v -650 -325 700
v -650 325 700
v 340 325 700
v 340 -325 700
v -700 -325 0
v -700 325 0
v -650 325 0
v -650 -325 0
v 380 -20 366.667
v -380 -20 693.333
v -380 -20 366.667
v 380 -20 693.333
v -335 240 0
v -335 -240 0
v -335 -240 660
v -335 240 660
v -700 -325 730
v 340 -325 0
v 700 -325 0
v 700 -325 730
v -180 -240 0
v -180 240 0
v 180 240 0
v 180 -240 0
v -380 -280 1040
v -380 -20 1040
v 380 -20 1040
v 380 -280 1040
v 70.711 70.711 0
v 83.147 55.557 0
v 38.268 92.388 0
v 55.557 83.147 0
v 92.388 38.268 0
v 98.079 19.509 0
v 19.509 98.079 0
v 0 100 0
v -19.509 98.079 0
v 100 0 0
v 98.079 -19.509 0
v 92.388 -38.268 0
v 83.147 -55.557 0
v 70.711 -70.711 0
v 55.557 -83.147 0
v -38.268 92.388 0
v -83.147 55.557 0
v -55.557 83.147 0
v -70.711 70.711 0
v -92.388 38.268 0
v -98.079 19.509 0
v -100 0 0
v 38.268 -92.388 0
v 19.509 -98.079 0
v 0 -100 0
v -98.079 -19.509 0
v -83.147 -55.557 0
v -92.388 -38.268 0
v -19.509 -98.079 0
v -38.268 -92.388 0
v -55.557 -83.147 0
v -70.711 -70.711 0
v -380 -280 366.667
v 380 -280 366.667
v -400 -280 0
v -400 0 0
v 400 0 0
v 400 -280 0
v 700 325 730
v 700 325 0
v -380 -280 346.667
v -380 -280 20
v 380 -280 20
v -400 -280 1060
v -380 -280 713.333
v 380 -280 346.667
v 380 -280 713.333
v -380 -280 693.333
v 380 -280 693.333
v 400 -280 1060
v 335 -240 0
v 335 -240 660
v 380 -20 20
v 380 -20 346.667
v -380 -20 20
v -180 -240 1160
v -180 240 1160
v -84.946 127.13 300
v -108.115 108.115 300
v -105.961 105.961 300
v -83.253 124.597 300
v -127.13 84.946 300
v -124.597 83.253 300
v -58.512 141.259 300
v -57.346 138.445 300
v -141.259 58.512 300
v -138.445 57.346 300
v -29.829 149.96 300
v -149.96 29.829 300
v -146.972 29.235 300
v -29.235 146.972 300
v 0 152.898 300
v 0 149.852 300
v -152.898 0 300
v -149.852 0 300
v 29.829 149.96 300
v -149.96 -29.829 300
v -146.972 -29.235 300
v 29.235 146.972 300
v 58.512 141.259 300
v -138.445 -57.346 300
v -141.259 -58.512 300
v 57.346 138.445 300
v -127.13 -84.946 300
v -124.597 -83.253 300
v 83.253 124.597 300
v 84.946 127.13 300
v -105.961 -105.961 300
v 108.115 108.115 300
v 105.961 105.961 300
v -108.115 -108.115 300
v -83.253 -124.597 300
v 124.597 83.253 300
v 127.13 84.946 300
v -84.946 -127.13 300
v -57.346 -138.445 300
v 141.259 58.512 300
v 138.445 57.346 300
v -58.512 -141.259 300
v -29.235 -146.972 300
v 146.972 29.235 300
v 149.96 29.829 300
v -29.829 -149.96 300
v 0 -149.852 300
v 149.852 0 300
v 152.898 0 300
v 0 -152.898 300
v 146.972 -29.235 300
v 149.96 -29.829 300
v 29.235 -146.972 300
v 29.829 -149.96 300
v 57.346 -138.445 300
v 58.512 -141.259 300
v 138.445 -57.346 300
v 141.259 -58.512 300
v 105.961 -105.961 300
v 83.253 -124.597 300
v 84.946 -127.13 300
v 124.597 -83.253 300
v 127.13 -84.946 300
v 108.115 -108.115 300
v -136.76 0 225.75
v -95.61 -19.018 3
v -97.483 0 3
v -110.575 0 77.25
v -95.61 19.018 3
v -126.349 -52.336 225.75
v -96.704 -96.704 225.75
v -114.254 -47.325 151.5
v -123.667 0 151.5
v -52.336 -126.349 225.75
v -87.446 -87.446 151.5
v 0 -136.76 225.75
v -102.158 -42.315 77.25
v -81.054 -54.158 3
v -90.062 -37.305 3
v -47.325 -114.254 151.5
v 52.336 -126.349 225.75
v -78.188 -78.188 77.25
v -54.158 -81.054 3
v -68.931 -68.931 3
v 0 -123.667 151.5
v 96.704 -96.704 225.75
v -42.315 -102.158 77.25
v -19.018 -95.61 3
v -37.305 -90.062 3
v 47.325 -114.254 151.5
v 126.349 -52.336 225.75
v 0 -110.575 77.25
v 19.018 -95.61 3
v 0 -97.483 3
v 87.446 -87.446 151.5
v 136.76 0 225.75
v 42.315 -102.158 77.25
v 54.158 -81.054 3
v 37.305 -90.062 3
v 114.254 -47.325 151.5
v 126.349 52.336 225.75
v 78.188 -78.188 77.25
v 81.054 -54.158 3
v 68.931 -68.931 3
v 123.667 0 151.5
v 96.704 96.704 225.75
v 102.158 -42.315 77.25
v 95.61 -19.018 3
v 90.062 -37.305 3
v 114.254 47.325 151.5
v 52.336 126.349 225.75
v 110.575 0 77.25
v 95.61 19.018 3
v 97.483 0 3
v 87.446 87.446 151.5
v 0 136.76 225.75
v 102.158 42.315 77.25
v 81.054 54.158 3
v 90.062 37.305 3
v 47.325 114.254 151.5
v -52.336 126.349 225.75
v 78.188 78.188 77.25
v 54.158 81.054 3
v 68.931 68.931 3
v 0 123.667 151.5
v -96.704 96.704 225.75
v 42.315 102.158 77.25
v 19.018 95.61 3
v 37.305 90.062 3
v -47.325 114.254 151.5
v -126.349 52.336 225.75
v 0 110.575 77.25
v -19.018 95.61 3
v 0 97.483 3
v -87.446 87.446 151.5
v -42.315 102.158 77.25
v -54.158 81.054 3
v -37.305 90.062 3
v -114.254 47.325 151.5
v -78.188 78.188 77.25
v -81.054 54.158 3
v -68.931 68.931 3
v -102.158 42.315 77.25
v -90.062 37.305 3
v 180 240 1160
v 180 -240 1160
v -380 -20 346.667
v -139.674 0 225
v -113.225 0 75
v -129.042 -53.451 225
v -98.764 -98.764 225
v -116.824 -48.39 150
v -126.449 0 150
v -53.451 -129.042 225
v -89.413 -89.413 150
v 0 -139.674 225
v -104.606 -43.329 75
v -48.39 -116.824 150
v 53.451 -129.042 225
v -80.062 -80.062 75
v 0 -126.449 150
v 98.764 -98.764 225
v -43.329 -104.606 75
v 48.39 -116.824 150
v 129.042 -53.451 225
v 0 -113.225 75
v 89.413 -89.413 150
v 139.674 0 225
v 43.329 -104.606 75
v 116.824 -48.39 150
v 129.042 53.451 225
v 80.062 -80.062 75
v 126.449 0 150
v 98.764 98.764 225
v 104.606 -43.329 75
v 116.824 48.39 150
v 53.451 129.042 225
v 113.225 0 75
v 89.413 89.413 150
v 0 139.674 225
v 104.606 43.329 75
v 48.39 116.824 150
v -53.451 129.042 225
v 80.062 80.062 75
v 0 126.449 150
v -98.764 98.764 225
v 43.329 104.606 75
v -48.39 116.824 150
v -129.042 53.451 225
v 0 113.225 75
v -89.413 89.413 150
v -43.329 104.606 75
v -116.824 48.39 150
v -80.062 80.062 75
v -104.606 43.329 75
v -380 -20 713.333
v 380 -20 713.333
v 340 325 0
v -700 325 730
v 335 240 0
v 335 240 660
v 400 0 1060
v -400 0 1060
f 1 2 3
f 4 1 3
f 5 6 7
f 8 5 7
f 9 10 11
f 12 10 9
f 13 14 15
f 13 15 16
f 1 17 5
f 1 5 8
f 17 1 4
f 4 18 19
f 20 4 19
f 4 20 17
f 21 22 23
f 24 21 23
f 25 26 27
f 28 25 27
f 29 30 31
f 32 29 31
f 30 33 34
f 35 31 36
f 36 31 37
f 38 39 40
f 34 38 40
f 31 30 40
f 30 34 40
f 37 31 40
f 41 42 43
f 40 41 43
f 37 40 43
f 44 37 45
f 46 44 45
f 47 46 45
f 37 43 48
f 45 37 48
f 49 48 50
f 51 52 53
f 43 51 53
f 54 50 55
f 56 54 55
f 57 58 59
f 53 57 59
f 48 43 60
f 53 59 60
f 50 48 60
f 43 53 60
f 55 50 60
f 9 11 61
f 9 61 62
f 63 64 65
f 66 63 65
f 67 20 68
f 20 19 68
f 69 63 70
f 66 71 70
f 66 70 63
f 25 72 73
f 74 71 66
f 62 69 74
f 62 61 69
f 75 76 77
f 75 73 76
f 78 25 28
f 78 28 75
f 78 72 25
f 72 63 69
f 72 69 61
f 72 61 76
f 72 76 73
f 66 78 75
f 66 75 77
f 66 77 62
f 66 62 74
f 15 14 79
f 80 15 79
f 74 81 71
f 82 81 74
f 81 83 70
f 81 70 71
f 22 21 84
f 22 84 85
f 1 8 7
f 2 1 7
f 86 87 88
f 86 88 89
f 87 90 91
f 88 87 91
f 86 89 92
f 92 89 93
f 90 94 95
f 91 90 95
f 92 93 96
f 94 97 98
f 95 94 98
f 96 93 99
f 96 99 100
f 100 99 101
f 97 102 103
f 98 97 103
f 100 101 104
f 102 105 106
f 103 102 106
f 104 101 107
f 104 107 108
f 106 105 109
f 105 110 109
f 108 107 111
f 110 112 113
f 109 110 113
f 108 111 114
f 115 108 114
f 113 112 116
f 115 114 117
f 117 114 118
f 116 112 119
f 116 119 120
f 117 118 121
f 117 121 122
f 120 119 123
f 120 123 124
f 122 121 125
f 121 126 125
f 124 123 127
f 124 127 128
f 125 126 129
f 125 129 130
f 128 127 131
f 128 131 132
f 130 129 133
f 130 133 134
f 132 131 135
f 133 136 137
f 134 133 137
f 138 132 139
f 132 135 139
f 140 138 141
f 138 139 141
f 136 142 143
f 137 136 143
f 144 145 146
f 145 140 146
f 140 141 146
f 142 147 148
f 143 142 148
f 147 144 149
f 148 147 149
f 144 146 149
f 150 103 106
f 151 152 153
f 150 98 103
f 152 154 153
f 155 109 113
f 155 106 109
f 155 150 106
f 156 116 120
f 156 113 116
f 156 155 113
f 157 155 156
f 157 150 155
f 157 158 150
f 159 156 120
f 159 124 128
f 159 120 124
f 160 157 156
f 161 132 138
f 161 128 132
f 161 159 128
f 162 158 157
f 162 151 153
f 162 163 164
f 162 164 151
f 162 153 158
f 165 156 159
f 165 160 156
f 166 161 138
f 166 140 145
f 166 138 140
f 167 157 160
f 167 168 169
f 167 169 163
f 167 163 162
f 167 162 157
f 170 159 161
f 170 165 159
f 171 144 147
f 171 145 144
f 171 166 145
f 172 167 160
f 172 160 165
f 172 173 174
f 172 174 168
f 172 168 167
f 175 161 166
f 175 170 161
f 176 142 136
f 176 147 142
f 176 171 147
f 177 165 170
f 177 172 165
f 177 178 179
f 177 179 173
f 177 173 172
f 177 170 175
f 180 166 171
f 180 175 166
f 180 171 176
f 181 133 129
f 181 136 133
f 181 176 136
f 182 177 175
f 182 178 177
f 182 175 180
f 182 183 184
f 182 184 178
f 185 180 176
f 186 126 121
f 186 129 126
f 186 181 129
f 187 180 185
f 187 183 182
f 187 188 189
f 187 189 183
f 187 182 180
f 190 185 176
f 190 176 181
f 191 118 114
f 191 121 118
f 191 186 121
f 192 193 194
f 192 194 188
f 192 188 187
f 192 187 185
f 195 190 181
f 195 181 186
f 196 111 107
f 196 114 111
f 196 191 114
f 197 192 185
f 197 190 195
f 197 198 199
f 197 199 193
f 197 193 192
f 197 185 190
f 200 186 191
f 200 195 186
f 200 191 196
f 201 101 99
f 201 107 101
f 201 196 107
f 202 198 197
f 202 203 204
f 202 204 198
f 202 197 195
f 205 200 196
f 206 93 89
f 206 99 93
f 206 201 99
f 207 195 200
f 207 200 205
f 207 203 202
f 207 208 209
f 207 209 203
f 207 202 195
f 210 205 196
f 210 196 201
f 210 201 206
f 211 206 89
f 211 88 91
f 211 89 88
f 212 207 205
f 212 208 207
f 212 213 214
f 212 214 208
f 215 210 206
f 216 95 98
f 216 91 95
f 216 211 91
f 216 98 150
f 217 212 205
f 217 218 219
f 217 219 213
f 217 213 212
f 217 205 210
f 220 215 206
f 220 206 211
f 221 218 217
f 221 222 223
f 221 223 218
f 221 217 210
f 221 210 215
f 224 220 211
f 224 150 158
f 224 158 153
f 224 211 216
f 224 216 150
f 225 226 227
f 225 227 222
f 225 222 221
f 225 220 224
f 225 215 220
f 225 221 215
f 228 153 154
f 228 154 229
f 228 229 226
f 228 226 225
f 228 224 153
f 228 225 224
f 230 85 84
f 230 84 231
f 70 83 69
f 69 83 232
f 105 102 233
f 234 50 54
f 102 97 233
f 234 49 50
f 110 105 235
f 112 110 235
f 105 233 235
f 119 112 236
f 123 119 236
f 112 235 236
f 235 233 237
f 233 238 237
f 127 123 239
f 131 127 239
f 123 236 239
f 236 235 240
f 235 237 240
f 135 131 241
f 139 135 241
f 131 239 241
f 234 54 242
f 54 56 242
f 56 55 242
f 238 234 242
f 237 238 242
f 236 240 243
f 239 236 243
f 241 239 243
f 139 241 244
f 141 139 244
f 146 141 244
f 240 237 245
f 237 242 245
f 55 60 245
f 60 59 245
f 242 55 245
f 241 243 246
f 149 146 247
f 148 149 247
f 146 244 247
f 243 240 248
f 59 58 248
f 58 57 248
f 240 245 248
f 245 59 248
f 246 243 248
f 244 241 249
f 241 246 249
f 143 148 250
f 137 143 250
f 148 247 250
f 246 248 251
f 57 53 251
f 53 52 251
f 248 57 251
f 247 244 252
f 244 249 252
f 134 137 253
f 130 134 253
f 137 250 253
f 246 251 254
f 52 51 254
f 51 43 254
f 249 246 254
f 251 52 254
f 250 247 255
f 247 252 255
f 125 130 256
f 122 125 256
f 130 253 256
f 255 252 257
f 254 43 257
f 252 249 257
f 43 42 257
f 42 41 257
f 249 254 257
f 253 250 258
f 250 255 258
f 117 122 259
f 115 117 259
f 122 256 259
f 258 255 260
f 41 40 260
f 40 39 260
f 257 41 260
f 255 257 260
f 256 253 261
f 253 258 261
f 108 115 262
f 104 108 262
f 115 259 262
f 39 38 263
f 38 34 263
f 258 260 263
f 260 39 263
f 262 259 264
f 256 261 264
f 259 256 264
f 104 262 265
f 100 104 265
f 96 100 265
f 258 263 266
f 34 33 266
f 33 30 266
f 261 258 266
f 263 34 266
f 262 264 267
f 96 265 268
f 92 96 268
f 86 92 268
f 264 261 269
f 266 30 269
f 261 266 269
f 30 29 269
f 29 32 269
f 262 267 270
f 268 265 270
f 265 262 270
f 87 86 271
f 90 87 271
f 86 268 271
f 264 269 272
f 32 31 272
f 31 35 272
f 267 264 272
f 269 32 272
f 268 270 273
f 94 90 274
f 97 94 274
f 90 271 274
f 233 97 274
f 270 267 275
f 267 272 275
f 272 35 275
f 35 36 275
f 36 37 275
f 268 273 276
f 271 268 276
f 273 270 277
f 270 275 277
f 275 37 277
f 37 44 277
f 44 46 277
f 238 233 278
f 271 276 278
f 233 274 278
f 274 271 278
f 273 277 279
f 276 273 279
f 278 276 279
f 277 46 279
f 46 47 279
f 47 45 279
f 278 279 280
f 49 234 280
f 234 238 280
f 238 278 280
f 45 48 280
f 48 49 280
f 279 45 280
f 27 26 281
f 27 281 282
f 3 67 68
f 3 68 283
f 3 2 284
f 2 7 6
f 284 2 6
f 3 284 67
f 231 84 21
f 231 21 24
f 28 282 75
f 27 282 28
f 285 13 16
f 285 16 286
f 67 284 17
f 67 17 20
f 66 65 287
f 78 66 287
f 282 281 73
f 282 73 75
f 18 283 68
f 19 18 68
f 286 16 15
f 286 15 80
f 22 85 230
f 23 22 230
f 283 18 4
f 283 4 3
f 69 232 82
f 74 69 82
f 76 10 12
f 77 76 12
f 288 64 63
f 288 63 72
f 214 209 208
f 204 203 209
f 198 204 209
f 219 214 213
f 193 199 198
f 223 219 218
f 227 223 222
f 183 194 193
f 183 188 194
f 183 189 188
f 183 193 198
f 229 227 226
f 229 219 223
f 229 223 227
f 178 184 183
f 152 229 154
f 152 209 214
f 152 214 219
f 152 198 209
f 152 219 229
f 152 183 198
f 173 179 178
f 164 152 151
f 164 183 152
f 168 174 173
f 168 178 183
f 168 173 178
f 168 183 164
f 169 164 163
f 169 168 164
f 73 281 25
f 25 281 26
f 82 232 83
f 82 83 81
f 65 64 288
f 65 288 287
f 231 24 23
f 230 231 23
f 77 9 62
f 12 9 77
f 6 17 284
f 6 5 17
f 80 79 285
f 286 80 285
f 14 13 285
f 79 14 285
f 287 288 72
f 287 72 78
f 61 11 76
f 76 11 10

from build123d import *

# Parameters (mm, degrees)
F0_W      = 670
F0_H      = 480
F1_DEPTH  = 660
F2_W      = 360
F2_H      = 480
F3_DEPTH  = 1160
F4_W      = 360
F4_H      = 650
F5_DEPTH  = 700
F4_W_2    = 50
F6_W      = 1040
F6_H      = 650
F6_W_2    = 360
F7_DEPTH  = 30
F8_W      = 800
F8_H      = 1060
F8_W_2    = 760
F8_H_2    = 326.6666666667
F9_DEPTH  = 280
F10_DEPTH = 20
F13_T     = -3


with BuildPart() as f1:
    # F0 (on Top) → F1 (new body)
    with BuildSketch(Plane.XY):
        Rectangle(F0_W, F0_H)
    extrude(amount=F1_DEPTH)


with BuildPart() as f3:
    # F2 (on Top) → F3 (new body)
    with BuildSketch(Plane.XY):
        Rectangle(F2_W, F2_H)
    extrude(amount=F3_DEPTH)


with BuildPart() as f5:
    # F4 (on Top) → F5 (new body)
    with BuildSketch(Plane.XY):
        with Locations((520, 0)):
            Rectangle(F4_W, F4_H)
    extrude(amount=F5_DEPTH)



with BuildPart() as f5b:
    # F4 (on Top) → F5, piece 2 (new body)
    with BuildSketch(Plane.XY):
        with Locations((-675, 0)):
            Rectangle(F4_W_2, F4_H)
    extrude(amount=F5_DEPTH)


with BuildPart() as f5_1:
    add(f5.part)

    add(f5b.part)  # F7 merges F5b
    # F6 (on face) → F7 (join)
    with BuildSketch(Plane.XY.offset(700)):
        with Locations((-180, 0)):
            Rectangle(F6_W, F6_H)
        with Locations((520, 0)):
            Rectangle(F6_W_2, F6_H)
    extrude(amount=F7_DEPTH)


with BuildPart() as f9:
    # F8 (on Front) → F9 (new body)
    with BuildSketch(Plane.XZ):
        with Locations((0, 530)):
            Rectangle(F8_W, F8_H)
        with Locations((0, 183.3333333333)):
            Rectangle(F8_W_2, F8_H_2, mode=Mode.SUBTRACT)
        with Locations((0, 530)):
            Rectangle(F8_W_2, F8_H_2, mode=Mode.SUBTRACT)
        with Locations((0, 876.6666666667)):
            Rectangle(F8_W_2, F8_H_2, mode=Mode.SUBTRACT)
    extrude(amount=F9_DEPTH)

    # F8 (on Front) → F10 (join)
    with BuildSketch(Plane.XZ):
        with Locations((0, 530)):
            Rectangle(F8_W, F8_H)
        with Locations((0, 183.3333333333)):
            Rectangle(F8_W_2, F8_H_2, mode=Mode.SUBTRACT)
        with Locations((0, 530)):
            Rectangle(F8_W_2, F8_H_2, mode=Mode.SUBTRACT)
        with Locations((0, 876.6666666667)):
            Rectangle(F8_W_2, F8_H_2, mode=Mode.SUBTRACT)
        with Locations((0, 876.6666666667)):
            Rectangle(F8_W_2, F8_H_2)
        with Locations((0, 530)):
            Rectangle(F8_W_2, F8_H_2)
        with Locations((0, 183.3333333333)):
            Rectangle(F8_W_2, F8_H_2)
    extrude(amount=F10_DEPTH)


with BuildPart() as f12:
    # F11 (on Front) → F12 (revolve)
    with BuildSketch(Plane.XZ):
        Polygon((0, 0), (0, 300), (-152.8980942125, 300), (-100, 0), align=None)
    revolve(axis=Axis((0, 0, 195.8250552416), (0, 0, 1)))

    # F13
    f13_openings = [f12.faces().sort_by_distance(p)[0] for p in [
        (0, 0, 300),
    ]]
    offset(amount=F13_T, openings=f13_openings)


solid = Compound([f1.part, f3.part, f5_1.part, f9.part, f12.part])
